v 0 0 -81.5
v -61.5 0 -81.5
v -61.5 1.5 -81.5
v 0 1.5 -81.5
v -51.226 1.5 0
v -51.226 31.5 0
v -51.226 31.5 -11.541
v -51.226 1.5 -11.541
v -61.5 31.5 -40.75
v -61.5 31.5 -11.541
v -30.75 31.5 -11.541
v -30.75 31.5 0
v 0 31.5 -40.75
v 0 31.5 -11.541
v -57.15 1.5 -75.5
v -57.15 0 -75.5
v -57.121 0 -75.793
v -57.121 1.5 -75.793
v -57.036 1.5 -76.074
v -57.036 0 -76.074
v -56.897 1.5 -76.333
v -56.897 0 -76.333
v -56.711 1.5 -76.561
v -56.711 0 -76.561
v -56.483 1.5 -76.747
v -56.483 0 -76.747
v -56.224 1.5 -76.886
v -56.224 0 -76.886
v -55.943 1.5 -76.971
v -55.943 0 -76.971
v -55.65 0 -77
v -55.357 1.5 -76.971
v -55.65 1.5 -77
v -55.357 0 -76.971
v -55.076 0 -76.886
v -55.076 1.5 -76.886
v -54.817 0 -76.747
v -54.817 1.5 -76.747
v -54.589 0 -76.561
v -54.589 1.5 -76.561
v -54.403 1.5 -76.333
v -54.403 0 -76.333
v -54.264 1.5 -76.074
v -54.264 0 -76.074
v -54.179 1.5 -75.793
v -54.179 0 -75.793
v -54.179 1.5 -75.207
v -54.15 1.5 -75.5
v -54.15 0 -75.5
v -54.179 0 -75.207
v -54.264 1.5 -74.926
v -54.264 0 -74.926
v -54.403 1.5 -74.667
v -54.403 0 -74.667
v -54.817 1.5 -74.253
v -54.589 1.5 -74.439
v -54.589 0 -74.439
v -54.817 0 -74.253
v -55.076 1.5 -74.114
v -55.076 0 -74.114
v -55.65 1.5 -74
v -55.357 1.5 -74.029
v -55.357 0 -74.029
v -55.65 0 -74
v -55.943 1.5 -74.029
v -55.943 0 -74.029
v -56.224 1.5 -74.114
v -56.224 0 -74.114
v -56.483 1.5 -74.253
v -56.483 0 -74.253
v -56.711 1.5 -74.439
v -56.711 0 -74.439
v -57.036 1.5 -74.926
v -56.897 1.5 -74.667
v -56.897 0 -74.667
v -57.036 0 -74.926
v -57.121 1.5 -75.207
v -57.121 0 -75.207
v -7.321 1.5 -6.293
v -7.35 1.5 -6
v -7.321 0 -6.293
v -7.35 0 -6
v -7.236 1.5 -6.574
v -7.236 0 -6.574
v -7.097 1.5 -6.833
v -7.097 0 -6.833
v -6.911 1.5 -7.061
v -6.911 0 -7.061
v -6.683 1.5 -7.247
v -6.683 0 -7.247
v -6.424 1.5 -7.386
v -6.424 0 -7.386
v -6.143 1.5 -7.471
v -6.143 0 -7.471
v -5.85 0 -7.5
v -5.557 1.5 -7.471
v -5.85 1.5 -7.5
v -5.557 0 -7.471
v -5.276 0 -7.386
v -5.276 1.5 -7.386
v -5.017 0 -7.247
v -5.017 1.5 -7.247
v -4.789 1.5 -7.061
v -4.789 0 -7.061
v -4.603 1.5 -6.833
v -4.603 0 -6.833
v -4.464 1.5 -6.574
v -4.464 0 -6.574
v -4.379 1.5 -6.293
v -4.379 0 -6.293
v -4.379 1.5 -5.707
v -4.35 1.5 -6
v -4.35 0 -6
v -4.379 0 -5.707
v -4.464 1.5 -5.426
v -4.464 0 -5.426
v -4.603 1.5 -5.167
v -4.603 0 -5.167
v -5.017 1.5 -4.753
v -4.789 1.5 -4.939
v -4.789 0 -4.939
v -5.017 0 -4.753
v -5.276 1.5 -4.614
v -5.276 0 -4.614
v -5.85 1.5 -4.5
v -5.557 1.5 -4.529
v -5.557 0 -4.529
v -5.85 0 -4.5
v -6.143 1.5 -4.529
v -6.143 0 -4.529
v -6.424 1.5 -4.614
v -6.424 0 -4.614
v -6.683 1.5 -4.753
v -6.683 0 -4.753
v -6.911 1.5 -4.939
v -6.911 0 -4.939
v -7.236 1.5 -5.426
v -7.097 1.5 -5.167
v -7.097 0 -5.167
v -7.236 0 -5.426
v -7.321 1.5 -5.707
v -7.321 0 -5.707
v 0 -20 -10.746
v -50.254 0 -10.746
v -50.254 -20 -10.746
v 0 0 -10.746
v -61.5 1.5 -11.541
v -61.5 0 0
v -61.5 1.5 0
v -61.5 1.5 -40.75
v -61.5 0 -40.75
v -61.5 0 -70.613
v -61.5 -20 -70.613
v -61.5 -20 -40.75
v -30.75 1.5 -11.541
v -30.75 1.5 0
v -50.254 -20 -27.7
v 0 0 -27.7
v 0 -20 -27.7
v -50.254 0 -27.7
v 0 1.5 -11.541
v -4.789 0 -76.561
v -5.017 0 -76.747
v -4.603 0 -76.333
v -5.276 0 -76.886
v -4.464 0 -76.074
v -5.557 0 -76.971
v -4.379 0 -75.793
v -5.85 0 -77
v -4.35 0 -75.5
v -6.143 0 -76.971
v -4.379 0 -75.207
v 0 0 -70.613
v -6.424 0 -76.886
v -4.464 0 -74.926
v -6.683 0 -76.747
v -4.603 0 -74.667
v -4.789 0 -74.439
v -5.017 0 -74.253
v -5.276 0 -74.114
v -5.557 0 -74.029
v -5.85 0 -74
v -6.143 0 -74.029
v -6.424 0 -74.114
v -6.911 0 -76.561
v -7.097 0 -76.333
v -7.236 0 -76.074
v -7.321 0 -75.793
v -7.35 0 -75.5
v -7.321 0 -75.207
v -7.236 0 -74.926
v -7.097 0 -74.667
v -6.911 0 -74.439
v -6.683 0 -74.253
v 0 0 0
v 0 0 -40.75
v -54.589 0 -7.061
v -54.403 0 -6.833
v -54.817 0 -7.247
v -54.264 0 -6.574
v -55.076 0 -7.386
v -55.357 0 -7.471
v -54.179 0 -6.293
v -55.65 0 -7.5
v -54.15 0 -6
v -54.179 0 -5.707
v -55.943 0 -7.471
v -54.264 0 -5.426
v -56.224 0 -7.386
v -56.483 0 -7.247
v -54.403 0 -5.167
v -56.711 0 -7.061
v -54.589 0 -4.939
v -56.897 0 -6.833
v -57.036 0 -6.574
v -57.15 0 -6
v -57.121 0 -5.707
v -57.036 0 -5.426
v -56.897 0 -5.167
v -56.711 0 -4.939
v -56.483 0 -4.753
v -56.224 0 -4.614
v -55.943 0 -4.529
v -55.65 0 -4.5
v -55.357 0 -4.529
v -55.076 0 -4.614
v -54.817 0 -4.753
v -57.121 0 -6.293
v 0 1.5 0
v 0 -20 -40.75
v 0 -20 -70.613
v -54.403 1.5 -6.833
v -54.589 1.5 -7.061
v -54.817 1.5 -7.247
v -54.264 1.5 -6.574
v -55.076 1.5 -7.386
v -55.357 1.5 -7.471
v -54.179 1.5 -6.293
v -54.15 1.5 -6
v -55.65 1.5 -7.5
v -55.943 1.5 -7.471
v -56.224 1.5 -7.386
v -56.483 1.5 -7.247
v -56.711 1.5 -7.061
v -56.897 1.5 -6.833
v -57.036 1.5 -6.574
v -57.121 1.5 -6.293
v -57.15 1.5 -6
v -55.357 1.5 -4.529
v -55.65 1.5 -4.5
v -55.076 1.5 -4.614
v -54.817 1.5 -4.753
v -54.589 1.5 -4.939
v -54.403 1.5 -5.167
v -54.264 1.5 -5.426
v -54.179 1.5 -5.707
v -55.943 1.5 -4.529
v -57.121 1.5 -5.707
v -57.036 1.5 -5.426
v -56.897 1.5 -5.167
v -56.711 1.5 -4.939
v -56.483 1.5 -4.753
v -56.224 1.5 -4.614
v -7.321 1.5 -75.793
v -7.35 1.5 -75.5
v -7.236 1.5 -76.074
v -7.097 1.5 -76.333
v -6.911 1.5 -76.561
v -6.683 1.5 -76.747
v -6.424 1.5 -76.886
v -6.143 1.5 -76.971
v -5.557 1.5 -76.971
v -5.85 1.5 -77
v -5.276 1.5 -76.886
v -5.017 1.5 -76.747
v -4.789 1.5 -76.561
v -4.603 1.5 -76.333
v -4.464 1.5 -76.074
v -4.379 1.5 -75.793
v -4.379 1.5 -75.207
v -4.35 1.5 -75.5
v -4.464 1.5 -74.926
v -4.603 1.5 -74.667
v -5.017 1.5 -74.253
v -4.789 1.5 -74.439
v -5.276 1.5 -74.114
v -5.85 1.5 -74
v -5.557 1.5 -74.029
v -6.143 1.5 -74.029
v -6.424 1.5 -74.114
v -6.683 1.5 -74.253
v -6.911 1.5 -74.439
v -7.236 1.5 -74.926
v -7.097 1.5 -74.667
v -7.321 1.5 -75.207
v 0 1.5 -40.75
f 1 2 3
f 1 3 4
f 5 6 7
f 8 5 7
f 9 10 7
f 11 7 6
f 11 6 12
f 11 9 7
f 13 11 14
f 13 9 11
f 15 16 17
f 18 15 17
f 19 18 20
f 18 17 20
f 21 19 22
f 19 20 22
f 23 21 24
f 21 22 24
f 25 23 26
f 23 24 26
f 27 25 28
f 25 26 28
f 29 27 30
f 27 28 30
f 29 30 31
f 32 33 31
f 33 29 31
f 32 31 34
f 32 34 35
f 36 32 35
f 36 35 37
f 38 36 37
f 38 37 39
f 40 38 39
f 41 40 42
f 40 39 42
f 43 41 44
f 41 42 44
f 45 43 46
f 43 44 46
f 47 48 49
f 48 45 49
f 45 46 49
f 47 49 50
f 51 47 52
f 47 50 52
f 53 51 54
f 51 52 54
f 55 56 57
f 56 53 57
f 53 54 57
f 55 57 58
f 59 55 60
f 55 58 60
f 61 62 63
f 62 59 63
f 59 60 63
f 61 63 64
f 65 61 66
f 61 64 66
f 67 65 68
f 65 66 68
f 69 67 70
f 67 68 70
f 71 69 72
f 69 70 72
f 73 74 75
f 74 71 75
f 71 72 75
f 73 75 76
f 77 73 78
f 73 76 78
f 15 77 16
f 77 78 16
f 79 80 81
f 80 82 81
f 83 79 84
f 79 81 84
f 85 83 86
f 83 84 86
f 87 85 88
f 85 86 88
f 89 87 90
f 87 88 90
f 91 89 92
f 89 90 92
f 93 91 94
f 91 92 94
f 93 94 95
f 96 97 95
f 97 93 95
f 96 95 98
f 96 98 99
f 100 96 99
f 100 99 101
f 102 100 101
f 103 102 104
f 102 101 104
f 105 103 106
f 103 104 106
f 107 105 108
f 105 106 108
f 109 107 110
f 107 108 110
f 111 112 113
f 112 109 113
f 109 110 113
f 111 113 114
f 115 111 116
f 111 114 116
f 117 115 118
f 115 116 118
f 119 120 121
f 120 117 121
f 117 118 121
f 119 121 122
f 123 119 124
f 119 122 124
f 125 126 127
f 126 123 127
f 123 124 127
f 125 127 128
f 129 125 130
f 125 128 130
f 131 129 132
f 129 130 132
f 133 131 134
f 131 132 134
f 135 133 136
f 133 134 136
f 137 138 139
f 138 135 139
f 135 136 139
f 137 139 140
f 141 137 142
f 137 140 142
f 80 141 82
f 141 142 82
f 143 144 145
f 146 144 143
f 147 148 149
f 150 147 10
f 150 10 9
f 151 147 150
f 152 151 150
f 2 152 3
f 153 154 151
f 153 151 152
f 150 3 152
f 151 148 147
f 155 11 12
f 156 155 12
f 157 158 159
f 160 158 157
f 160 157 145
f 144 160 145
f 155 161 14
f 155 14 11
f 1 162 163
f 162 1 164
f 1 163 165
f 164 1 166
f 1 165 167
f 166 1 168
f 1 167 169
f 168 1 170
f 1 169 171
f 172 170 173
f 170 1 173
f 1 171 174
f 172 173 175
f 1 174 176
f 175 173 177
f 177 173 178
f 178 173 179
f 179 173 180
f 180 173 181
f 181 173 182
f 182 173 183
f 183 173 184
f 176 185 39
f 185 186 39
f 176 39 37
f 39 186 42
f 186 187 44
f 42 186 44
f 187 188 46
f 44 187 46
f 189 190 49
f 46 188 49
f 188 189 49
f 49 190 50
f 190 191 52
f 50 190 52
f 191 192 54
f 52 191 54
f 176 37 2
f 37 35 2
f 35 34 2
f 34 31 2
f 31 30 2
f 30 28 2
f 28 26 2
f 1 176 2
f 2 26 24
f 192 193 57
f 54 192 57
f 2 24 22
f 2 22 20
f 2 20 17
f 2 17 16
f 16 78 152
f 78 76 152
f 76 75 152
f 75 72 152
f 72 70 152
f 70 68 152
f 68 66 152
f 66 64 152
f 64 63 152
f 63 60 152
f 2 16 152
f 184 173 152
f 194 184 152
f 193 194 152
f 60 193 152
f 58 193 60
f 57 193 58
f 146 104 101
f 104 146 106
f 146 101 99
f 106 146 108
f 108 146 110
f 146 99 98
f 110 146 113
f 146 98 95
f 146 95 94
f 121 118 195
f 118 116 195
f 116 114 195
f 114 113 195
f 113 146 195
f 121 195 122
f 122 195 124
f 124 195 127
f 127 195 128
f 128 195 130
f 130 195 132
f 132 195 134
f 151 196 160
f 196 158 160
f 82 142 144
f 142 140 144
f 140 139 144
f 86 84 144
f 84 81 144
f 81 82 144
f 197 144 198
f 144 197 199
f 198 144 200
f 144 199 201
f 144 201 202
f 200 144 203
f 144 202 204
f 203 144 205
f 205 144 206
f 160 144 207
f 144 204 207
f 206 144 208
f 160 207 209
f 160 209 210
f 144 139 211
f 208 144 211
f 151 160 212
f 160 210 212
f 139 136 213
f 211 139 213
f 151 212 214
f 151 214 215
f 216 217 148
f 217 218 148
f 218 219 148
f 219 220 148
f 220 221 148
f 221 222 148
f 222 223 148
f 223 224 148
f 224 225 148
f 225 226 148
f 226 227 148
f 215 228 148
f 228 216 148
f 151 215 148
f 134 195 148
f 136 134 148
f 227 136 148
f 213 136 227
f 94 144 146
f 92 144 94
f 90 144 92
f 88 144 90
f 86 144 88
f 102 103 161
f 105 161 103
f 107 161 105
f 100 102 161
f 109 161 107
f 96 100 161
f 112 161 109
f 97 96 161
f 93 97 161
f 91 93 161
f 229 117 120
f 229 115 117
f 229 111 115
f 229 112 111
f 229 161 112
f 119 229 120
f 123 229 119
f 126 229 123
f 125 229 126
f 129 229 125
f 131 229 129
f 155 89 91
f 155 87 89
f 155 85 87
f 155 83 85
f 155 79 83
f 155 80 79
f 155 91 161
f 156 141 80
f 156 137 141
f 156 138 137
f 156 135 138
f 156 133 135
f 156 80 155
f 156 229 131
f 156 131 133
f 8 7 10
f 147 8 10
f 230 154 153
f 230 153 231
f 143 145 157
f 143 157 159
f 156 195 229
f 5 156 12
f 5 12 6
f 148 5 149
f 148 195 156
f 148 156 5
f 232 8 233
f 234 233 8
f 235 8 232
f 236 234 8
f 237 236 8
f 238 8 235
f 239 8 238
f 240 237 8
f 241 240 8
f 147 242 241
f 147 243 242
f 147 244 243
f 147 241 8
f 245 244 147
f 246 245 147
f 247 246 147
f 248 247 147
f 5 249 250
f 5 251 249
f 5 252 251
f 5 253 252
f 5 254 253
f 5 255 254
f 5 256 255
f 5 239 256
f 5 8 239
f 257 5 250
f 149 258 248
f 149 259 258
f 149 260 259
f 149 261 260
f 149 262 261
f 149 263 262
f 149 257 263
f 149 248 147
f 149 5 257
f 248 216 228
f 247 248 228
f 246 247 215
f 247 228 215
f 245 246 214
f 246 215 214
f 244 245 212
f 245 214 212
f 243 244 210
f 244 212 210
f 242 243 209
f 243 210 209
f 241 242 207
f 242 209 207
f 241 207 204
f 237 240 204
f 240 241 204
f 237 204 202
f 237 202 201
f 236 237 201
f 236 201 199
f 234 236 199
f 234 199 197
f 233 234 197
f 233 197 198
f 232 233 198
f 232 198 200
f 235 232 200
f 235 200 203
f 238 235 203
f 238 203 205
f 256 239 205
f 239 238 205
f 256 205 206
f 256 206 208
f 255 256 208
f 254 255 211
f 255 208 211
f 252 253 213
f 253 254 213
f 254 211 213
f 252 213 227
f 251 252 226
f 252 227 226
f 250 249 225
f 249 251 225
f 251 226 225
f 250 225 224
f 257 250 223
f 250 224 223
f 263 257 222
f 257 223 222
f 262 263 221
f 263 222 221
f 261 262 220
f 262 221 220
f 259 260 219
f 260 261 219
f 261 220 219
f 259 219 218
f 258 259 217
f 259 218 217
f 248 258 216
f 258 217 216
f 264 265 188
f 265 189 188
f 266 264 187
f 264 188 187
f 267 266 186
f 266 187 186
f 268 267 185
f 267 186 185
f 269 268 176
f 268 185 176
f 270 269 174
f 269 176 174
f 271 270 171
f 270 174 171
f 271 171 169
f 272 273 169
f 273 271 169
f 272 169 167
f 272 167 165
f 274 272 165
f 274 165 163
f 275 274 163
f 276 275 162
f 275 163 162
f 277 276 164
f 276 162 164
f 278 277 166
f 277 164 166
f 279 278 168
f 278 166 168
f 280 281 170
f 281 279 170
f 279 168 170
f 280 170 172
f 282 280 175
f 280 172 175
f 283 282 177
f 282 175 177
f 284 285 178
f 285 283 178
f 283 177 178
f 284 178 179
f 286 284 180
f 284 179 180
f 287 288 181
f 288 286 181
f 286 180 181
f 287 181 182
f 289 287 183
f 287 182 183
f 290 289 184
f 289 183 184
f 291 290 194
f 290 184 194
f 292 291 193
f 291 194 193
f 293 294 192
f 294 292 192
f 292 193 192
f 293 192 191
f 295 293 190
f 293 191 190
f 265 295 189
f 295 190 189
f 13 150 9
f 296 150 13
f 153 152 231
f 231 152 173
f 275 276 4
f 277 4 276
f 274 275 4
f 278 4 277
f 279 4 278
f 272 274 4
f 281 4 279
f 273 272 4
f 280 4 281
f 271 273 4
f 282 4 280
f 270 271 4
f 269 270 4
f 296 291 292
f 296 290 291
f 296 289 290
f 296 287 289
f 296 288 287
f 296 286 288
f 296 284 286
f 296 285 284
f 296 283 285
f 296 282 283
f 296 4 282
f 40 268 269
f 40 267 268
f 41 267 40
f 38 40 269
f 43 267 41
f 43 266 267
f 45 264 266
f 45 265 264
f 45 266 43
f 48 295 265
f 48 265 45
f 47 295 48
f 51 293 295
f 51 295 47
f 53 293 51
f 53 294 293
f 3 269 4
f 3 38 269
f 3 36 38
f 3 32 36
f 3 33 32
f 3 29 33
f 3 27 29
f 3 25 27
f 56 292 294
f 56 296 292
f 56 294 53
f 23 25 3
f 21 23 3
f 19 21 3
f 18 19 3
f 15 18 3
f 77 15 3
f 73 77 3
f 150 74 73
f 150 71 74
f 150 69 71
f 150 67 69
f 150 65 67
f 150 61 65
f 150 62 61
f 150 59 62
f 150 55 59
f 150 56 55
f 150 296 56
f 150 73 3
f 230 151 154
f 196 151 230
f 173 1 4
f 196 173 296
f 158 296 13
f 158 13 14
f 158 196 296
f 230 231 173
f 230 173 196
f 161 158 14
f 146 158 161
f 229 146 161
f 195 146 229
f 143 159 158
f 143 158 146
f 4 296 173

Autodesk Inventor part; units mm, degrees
ref_plane "YZ Plane" through (0, 0, 0) normal (1, 0, 0) x (0, 1, 0)
ref_plane "XZ Plane" through (0, 0, 0) normal (0, 1, 0) x (-1, 0, 0)
ref_plane "XY Plane" through (0, 0, 0) normal (0, 0, 1) x (1, 0, 0)
sketch "Sketch1" plane through (0, 0, 0) normal (0, 1, 0) x (-1, 0, 0)
  line L0 (0, 0) -> (61.5, 0)
  line L1 (61.5, 0) -> (61.5, -81.5)
  line L2 (61.5, -81.5) -> (0, -81.5)
  line L3 (0, -81.5) -> (0, 0)
  line L4 (61.5, -40.75) -> (0, -40.75)
  line L5 (30.75, 0) -> (30.75, -81.5)
  line L6 (30.75, -81.5) -> (30.75, 0)
  circle A0 centre (55.65, -6) radius 1.5
  circle A1 centre (5.85, -6) radius 1.5
  circle A2 centre (55.65, -75.5) radius 1.5
  circle A3 centre (5.85, -75.5) radius 1.5
  dimension "d0" = 61.5
  dimension "d1" = 81.5
  dimension "d2" = 69.5
  dimension "d3" = 49.8
  dimension "d4" = 3
extrude "Extrusion1" add sketch "Sketch1" along normal blind 1.5
sketch "Sketch2" plane through (0, 1.5, 0) normal (0, 1, 0) x (1, 0, 0)
  line L0 (-61.5, 81.5) -> (-61.5, 0) projected
  line L1 (-61.5, 40.75) -> (0, 40.75)
  line L2 (0, 40.75) -> (0, 11.5412)
  line L3 (0, 11.5412) -> (-61.5, 11.5412)
  line L4 (-61.5, 11.5412) -> (-61.5, 40.75)
  line L5 (-61.5, 0) -> (0, 0) projected
  line L6 (-29.2541, 11.5412) -> (-51.2255, 11.5412)
  line L7 (-61.5, 68.5681) -> (-61.5, 63.2604)
  line L8 (-51.2255, 11.5412) -> (-30.75, 11.5412)
  line L9 (-30.75, 11.5412) -> (-30.75, 0)
  line L10 (-30.75, 0) -> (-51.2255, 0)
  line L11 (-51.2255, 0) -> (-51.2255, 11.5412)
  point P0 (0, 68.5681)
extrude "Extrusion2" add sketch "Sketch2" along normal blind 30 contours L1 L2 L3 L0 | L3 L9 L5 L11
sketch "Sketch3" plane through (0, 0, 0) normal (0, -1, 0) x (1, 0, 0)
  line L0 (-61.5, -81.5) -> (-61.5, 0) projected
  line L1 (-61.5, -40.75) -> (0, -40.75) projected
  line L2 (-61.5, -70.6132) -> (0, -70.6132)
  line L3 (0, -70.6132) -> (0, -40.75)
  line L4 (0, -40.75) -> (-61.5, -40.75)
  line L5 (-61.5, -40.75) -> (-61.5, -70.6132)
  line L6 (0, 0) -> (0, -81.5) projected
  line L7 (-50.2544, -10.7457) -> (0, -10.7457)
  line L8 (0, -10.7457) -> (0, -27.6996)
  line L9 (0, -27.6996) -> (-50.2544, -27.6996)
  line L10 (-50.2544, -27.6996) -> (-50.2544, -10.7457)
extrude "Extrusion3" add sketch "Sketch3" along normal blind 20
properties part number "Platine"
